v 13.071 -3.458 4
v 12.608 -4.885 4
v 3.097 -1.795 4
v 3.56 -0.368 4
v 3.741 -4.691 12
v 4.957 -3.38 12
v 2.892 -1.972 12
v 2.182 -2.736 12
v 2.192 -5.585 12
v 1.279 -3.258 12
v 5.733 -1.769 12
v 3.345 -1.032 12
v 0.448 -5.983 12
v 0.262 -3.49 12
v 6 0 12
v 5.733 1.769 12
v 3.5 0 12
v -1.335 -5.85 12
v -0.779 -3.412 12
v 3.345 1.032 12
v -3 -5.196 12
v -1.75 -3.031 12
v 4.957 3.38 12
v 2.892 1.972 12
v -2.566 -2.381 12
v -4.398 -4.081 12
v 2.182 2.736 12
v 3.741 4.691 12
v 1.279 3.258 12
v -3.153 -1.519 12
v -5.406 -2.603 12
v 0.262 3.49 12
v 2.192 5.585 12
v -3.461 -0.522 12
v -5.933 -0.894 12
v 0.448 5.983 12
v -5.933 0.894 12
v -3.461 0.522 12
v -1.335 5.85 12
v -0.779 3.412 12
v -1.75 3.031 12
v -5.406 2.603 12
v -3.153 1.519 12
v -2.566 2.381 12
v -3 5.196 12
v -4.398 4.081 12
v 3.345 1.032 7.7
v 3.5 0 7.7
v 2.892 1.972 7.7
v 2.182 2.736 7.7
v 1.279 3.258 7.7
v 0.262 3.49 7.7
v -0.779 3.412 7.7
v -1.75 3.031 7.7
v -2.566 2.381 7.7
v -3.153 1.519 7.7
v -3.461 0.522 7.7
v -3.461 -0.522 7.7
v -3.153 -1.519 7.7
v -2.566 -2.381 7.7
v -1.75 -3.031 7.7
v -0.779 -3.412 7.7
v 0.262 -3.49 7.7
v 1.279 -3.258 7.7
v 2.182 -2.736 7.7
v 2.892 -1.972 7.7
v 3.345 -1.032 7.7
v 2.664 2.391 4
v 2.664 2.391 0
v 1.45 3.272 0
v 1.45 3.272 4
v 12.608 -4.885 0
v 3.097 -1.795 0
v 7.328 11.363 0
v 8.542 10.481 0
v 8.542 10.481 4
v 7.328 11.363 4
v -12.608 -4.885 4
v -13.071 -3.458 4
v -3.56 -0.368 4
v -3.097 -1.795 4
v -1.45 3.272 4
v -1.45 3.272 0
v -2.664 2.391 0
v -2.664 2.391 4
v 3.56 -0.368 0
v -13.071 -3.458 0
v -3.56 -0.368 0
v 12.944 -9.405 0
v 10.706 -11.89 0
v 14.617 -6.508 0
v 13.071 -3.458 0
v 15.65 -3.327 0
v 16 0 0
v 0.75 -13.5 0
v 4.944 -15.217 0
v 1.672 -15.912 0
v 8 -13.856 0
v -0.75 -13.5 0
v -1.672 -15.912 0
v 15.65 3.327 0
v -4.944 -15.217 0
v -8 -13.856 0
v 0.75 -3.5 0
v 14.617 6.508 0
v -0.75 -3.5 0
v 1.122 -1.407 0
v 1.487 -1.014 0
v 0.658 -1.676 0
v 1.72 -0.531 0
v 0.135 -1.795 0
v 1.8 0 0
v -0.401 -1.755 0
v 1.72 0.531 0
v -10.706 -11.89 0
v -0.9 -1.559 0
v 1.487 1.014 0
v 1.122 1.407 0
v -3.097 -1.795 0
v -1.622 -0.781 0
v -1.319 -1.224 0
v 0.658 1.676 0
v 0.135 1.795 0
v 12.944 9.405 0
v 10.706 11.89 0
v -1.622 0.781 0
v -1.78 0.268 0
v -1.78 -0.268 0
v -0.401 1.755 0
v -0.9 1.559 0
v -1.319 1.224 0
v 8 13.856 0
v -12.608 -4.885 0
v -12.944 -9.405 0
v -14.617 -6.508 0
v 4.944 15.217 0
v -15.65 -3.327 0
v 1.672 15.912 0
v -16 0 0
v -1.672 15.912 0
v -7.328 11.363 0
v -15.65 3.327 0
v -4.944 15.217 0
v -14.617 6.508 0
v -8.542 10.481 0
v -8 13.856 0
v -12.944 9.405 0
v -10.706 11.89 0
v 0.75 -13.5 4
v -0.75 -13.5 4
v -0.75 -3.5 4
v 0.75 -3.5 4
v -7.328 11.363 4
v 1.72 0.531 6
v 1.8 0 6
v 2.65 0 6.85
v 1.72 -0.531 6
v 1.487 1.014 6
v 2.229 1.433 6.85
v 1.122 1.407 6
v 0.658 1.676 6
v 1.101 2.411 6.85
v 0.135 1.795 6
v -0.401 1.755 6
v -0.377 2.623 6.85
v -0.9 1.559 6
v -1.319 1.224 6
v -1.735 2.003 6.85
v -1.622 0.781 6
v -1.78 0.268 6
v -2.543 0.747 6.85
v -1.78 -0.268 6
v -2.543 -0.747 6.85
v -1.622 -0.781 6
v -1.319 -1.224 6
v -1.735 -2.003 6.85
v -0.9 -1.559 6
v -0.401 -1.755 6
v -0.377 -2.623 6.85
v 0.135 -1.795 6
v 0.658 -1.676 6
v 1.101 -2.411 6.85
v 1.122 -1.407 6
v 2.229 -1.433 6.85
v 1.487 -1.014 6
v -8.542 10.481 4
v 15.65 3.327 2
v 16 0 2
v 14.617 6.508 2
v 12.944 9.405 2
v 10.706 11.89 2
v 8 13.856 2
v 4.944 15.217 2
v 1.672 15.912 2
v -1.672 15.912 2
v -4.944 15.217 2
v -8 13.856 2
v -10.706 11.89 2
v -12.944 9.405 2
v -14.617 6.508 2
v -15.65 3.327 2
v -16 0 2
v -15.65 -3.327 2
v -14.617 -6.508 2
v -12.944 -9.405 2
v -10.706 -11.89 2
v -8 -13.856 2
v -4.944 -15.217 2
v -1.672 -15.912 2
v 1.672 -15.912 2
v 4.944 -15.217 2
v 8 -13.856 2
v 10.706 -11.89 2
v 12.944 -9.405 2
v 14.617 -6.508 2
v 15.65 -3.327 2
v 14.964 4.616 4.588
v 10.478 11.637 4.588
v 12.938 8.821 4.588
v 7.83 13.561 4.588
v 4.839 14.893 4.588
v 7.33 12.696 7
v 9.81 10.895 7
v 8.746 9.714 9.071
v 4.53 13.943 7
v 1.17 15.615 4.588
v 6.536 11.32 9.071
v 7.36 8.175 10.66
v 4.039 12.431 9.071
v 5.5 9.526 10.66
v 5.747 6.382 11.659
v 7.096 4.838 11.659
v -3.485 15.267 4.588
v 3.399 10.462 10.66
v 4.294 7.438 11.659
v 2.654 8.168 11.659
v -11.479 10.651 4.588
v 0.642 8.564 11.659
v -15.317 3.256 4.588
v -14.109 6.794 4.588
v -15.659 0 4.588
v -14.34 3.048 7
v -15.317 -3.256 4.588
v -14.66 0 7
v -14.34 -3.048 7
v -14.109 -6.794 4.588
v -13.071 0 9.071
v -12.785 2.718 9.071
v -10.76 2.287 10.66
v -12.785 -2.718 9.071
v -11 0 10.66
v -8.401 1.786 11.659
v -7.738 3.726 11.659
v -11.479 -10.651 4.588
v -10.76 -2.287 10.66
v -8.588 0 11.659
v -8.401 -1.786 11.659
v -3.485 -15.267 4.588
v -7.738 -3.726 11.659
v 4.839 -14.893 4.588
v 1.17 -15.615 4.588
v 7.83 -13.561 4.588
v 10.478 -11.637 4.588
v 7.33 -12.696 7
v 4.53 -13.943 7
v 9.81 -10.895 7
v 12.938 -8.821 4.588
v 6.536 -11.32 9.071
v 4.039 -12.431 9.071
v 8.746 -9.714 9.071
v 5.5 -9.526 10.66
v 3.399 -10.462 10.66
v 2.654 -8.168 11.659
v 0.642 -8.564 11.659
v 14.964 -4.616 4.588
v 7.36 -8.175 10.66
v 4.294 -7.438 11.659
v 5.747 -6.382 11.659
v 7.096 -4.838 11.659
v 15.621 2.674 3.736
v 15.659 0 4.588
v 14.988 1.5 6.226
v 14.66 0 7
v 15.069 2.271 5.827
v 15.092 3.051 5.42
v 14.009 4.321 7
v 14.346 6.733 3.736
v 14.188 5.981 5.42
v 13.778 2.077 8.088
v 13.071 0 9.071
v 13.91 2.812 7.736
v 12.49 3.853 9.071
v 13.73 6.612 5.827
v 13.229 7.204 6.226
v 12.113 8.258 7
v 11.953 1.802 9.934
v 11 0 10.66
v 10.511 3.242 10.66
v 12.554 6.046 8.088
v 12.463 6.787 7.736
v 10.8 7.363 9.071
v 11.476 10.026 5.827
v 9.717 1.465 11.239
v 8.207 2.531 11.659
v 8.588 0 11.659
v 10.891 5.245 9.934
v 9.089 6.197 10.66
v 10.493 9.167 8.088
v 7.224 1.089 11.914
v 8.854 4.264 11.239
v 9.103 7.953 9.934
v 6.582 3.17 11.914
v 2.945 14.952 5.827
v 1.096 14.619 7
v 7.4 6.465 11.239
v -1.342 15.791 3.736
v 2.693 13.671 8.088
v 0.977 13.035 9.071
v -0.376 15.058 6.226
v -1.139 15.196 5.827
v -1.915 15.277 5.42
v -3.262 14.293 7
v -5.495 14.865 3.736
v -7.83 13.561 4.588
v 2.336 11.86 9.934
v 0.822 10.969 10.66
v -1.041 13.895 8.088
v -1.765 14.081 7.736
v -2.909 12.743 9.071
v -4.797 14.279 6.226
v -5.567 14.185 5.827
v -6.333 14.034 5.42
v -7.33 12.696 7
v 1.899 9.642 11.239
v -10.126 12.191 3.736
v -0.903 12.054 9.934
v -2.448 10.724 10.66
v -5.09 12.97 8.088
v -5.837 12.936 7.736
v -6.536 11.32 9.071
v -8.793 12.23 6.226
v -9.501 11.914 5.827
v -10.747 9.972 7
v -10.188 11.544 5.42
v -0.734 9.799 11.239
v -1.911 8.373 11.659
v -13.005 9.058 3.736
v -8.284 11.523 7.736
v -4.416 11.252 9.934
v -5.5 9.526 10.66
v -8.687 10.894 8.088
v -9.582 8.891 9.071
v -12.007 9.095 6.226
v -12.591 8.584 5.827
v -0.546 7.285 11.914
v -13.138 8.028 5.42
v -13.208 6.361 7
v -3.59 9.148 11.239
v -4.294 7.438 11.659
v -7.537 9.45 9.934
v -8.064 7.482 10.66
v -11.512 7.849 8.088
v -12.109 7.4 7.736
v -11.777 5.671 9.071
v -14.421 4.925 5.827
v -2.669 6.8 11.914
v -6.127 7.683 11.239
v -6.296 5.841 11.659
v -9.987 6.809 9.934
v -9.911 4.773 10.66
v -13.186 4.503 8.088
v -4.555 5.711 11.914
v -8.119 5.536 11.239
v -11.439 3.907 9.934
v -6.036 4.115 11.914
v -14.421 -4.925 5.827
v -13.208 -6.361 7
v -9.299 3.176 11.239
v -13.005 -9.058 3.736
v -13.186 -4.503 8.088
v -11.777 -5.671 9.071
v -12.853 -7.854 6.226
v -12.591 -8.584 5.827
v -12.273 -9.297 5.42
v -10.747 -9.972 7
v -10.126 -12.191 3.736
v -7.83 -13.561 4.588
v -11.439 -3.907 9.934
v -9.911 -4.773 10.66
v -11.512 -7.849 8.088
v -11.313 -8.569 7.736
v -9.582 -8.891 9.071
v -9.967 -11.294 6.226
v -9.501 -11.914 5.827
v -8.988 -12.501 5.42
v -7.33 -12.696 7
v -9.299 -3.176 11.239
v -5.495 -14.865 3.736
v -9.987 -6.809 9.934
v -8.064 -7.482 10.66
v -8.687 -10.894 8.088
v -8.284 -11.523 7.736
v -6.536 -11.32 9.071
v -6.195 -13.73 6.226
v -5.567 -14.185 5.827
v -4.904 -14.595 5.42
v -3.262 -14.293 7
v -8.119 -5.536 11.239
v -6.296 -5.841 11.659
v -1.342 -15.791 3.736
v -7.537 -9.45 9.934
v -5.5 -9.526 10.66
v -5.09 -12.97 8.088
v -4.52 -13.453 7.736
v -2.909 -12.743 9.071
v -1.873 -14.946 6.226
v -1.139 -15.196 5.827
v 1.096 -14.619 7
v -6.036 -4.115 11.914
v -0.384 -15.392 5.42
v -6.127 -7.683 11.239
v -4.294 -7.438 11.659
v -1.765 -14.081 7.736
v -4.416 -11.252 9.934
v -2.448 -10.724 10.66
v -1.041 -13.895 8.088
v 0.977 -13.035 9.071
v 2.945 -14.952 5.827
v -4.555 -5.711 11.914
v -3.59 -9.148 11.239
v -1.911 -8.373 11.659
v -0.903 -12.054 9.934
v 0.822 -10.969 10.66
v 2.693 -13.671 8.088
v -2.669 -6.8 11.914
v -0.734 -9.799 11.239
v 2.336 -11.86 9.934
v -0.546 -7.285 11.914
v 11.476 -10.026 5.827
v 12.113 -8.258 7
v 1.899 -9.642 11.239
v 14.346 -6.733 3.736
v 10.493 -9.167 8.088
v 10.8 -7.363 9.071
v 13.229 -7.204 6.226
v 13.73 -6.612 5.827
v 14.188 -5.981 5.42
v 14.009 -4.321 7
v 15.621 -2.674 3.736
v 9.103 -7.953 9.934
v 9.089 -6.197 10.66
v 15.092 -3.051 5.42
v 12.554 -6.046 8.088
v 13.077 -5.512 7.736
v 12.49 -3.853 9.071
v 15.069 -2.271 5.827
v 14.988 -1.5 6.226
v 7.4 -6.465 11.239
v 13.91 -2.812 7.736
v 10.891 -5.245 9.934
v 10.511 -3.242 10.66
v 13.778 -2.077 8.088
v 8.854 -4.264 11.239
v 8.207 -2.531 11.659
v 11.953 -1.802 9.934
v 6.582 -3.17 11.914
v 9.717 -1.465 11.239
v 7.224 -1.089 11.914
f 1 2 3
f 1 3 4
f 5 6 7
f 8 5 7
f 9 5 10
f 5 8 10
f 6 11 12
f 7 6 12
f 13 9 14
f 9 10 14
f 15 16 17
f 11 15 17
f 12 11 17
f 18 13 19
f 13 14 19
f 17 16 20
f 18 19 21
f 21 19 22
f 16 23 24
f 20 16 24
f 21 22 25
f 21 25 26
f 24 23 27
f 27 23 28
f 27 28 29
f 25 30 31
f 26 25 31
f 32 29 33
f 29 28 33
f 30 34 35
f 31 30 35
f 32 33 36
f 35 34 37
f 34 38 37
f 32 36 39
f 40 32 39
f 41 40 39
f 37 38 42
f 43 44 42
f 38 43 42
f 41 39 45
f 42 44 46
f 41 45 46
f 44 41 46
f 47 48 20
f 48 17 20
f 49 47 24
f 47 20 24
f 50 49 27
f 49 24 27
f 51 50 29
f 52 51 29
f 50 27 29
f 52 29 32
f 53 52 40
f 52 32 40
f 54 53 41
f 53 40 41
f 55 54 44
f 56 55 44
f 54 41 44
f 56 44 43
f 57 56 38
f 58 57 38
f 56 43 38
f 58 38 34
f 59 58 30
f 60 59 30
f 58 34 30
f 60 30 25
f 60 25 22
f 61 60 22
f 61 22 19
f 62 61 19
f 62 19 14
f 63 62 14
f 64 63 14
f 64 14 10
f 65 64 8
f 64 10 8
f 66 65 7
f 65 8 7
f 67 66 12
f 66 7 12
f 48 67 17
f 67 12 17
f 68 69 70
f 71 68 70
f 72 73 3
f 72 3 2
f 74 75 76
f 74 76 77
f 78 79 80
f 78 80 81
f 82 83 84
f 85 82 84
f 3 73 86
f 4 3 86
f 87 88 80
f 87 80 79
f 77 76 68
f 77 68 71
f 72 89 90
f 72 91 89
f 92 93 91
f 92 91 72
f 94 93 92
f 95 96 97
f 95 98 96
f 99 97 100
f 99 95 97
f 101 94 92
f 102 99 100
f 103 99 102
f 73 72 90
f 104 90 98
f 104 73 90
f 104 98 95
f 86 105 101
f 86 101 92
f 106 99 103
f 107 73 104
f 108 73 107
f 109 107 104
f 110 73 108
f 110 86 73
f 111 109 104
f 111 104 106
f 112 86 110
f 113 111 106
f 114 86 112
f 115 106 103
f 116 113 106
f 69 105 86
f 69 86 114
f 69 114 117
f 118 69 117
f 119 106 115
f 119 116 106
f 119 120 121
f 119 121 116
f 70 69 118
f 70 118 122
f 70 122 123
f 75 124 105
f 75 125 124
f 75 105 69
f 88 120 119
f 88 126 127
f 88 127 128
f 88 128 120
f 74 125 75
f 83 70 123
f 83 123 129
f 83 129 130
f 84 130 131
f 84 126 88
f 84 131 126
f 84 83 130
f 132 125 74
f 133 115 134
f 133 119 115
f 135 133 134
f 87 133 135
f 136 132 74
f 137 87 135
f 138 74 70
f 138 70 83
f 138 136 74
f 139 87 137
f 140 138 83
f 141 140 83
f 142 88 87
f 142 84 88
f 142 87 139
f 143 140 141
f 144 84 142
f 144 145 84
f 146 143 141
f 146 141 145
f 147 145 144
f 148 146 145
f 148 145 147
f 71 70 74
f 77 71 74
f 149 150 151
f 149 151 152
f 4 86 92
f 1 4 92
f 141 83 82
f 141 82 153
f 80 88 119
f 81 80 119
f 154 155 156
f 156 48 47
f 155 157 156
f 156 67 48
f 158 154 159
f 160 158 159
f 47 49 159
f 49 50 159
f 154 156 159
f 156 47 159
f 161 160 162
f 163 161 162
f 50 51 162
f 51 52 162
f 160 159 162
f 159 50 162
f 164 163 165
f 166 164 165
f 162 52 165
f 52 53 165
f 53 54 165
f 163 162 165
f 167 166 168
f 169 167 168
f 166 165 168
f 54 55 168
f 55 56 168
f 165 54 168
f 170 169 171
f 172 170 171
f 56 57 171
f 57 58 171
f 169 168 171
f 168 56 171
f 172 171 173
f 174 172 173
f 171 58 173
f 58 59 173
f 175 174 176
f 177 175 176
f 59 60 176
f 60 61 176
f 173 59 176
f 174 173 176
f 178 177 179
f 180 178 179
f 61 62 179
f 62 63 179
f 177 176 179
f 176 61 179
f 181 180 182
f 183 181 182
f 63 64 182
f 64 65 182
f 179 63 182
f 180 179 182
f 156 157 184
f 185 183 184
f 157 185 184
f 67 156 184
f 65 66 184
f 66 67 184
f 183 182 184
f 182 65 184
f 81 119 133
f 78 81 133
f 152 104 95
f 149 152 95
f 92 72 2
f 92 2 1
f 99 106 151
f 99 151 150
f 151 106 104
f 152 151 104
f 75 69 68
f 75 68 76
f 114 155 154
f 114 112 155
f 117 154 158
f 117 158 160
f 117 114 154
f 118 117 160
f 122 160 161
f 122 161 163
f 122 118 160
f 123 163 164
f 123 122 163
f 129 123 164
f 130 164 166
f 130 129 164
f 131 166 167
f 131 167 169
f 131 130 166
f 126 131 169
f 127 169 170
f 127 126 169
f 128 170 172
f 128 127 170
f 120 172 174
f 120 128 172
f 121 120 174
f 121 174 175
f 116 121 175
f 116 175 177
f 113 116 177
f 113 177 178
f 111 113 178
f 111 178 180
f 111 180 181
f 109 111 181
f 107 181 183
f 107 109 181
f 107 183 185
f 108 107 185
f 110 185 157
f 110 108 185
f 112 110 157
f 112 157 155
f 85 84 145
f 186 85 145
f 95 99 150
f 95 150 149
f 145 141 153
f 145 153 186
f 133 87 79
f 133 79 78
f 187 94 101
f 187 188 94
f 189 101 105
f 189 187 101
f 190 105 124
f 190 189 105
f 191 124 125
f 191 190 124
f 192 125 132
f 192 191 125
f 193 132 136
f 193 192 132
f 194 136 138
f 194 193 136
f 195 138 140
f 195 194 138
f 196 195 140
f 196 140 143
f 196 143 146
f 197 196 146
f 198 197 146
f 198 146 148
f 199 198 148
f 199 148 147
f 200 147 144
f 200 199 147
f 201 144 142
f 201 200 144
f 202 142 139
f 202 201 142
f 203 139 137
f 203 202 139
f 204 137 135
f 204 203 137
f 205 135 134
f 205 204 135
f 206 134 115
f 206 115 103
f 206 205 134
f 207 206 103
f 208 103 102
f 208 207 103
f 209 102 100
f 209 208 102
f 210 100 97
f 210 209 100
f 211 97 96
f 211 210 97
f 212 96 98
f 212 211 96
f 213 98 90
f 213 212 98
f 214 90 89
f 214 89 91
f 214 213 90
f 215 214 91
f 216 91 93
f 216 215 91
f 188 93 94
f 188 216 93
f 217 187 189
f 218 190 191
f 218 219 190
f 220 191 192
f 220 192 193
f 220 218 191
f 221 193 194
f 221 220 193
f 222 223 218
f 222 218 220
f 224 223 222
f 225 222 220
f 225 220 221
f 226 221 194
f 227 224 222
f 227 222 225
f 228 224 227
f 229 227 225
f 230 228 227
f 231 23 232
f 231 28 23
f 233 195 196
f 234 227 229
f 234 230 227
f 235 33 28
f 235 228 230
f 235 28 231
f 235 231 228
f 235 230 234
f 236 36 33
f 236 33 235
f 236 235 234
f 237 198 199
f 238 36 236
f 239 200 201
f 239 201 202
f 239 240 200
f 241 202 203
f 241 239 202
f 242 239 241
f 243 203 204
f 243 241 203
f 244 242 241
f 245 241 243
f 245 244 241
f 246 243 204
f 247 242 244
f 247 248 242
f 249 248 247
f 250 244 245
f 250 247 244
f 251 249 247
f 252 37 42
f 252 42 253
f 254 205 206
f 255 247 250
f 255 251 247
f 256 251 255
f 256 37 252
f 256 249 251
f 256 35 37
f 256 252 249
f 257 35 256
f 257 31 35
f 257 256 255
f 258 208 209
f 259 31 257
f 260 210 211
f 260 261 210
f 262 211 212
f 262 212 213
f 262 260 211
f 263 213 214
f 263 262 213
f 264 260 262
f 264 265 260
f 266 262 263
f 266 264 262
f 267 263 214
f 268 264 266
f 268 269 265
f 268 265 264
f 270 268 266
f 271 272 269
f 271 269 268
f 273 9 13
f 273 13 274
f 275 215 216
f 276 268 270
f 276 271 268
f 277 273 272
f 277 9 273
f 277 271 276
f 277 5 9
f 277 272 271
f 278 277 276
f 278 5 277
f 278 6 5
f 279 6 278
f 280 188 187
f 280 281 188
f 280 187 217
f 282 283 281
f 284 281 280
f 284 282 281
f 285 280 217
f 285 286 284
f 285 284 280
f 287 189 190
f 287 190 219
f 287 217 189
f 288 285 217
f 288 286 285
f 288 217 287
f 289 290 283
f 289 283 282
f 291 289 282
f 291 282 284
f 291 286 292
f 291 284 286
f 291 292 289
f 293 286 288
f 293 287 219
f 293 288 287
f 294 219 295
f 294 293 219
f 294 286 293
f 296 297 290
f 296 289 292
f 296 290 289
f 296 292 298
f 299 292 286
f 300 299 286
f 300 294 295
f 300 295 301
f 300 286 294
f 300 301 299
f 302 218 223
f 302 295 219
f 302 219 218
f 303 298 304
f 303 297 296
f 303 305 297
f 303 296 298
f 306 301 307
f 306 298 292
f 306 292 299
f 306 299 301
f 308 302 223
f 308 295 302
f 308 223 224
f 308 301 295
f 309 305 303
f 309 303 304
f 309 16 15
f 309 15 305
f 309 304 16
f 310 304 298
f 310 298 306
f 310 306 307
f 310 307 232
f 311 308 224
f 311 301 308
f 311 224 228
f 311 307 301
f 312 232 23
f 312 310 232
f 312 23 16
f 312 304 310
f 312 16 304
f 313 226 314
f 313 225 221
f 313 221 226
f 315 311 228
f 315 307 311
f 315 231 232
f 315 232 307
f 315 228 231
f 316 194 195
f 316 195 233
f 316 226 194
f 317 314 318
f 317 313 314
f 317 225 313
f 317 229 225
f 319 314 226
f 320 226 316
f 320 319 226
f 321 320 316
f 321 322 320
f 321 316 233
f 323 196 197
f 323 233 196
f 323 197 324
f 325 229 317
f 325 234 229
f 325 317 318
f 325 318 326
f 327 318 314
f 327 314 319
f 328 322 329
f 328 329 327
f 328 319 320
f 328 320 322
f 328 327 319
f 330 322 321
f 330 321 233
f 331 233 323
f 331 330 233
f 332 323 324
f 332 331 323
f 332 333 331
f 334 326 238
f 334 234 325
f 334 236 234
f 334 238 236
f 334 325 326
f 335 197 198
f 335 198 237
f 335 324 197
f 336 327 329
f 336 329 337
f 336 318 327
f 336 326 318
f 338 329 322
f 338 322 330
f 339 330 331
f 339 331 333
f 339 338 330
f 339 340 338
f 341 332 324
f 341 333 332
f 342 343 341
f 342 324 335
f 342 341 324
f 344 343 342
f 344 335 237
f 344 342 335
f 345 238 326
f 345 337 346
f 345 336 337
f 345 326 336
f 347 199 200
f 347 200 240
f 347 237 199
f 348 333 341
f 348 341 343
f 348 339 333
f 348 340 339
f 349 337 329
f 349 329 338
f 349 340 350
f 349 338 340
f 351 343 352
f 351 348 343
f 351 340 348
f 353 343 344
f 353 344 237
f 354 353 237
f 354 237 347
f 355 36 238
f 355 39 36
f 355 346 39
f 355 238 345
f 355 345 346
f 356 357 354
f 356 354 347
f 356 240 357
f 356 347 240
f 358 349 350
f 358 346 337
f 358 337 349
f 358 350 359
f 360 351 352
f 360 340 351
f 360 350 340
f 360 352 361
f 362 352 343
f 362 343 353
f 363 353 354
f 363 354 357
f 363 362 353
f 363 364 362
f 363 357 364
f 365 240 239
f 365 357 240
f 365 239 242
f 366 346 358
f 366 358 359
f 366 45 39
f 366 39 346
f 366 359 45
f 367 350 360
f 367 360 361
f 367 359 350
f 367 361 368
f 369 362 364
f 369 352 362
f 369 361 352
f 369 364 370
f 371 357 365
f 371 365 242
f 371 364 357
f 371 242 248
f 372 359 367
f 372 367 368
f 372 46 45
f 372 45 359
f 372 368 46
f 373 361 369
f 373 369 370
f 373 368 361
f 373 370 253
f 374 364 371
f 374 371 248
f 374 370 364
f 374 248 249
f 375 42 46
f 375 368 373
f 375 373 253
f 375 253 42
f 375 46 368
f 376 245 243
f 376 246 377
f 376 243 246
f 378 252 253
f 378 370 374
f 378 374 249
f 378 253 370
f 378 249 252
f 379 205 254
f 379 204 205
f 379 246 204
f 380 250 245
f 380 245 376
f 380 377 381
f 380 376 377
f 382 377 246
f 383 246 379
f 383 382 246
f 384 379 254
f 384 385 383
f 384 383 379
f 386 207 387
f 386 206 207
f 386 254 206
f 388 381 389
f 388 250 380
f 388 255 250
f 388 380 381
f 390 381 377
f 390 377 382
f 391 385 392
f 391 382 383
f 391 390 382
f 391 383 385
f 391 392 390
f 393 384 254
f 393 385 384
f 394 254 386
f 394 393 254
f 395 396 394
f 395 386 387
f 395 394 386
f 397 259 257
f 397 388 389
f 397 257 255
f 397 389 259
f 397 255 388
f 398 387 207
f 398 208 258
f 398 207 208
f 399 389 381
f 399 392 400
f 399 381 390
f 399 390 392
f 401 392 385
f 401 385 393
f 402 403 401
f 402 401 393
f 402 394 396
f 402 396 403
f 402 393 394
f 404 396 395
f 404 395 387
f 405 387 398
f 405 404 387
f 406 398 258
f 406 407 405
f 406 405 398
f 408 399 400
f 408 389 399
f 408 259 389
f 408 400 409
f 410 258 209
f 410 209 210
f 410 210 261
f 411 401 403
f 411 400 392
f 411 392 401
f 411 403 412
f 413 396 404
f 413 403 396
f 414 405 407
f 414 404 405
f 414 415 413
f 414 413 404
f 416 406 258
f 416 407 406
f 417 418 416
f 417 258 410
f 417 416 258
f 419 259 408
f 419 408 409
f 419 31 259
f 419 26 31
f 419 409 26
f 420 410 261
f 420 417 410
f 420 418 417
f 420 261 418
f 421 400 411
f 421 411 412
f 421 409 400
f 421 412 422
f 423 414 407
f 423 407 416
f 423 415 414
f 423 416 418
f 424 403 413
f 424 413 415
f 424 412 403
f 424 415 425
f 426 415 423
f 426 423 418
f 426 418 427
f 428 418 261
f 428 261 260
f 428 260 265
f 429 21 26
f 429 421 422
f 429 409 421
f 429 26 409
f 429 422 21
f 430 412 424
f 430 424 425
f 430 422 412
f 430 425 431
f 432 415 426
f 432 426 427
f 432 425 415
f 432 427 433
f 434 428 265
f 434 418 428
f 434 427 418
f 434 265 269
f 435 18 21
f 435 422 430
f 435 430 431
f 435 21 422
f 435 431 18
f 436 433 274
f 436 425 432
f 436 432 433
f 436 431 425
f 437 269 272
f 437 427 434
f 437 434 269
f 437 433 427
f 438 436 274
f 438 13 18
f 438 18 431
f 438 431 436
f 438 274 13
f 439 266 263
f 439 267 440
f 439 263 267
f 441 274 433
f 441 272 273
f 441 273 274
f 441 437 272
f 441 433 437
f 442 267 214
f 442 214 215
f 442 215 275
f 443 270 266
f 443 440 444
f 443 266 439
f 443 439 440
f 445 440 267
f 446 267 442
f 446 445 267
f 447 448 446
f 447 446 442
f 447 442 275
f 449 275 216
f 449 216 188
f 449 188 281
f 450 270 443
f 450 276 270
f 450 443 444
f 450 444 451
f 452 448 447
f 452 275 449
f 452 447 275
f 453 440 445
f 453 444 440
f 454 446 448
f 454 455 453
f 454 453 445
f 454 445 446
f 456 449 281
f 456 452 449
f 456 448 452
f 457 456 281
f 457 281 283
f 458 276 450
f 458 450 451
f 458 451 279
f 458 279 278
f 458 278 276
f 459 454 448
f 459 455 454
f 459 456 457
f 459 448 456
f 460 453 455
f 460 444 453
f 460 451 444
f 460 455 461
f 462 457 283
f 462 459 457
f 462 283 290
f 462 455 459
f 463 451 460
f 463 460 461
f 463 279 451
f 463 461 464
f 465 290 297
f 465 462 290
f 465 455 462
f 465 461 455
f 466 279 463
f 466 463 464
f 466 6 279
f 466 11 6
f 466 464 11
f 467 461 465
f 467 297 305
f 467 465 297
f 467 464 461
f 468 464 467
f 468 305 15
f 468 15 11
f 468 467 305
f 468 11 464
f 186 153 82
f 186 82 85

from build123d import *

# Parameters (mm, degrees)
SKETCH001_W        = 1.5
SKETCH001_H        = 10
POCKET_DEPTH       = 4
POLARPATTERN_COUNT = 5


with BuildPart() as part:
    # Sketch → Revolution (revolve)
    with BuildSketch(Plane.XZ):
        with BuildLine():
            Line((16, 0), (16, 2))
            ThreePointArc((16, 2), (13.071068, 9.071068), (6, 12))
            Line((3.5, 12), (6, 12))
            Line((3.5, 7.7), (3.5, 12))
            Line((1.8, 6), (3.5, 7.7))
            Line((1.8, 6), (1.8, 0))
            Line((1.8, 0), (16, 0))
        make_face()
    revolve(axis=Axis((0, 0, 0), (0, 0, 1)))

    # Sketch001 (on Face2 of Revolution) → Pocket (cut)
    with BuildSketch(Plane(origin=(0, 0, 0), x_dir=(1, 0, 0), z_dir=(0, 0, -1))):
        with Locations((0, 8.5)):
            Rectangle(SKETCH001_W, SKETCH001_H)
    pocket = extrude(amount=-POCKET_DEPTH, mode=Mode.SUBTRACT)

    # PolarPattern: Pocket ×5 about axis
    polarpattern_axis = Axis((0, 0, 0), (0, 0, -1))
    for i in range(1, POLARPATTERN_COUNT):
        add(pocket.rotate(polarpattern_axis, i * 360 / POLARPATTERN_COUNT), mode=Mode.SUBTRACT)


solid = part.part
